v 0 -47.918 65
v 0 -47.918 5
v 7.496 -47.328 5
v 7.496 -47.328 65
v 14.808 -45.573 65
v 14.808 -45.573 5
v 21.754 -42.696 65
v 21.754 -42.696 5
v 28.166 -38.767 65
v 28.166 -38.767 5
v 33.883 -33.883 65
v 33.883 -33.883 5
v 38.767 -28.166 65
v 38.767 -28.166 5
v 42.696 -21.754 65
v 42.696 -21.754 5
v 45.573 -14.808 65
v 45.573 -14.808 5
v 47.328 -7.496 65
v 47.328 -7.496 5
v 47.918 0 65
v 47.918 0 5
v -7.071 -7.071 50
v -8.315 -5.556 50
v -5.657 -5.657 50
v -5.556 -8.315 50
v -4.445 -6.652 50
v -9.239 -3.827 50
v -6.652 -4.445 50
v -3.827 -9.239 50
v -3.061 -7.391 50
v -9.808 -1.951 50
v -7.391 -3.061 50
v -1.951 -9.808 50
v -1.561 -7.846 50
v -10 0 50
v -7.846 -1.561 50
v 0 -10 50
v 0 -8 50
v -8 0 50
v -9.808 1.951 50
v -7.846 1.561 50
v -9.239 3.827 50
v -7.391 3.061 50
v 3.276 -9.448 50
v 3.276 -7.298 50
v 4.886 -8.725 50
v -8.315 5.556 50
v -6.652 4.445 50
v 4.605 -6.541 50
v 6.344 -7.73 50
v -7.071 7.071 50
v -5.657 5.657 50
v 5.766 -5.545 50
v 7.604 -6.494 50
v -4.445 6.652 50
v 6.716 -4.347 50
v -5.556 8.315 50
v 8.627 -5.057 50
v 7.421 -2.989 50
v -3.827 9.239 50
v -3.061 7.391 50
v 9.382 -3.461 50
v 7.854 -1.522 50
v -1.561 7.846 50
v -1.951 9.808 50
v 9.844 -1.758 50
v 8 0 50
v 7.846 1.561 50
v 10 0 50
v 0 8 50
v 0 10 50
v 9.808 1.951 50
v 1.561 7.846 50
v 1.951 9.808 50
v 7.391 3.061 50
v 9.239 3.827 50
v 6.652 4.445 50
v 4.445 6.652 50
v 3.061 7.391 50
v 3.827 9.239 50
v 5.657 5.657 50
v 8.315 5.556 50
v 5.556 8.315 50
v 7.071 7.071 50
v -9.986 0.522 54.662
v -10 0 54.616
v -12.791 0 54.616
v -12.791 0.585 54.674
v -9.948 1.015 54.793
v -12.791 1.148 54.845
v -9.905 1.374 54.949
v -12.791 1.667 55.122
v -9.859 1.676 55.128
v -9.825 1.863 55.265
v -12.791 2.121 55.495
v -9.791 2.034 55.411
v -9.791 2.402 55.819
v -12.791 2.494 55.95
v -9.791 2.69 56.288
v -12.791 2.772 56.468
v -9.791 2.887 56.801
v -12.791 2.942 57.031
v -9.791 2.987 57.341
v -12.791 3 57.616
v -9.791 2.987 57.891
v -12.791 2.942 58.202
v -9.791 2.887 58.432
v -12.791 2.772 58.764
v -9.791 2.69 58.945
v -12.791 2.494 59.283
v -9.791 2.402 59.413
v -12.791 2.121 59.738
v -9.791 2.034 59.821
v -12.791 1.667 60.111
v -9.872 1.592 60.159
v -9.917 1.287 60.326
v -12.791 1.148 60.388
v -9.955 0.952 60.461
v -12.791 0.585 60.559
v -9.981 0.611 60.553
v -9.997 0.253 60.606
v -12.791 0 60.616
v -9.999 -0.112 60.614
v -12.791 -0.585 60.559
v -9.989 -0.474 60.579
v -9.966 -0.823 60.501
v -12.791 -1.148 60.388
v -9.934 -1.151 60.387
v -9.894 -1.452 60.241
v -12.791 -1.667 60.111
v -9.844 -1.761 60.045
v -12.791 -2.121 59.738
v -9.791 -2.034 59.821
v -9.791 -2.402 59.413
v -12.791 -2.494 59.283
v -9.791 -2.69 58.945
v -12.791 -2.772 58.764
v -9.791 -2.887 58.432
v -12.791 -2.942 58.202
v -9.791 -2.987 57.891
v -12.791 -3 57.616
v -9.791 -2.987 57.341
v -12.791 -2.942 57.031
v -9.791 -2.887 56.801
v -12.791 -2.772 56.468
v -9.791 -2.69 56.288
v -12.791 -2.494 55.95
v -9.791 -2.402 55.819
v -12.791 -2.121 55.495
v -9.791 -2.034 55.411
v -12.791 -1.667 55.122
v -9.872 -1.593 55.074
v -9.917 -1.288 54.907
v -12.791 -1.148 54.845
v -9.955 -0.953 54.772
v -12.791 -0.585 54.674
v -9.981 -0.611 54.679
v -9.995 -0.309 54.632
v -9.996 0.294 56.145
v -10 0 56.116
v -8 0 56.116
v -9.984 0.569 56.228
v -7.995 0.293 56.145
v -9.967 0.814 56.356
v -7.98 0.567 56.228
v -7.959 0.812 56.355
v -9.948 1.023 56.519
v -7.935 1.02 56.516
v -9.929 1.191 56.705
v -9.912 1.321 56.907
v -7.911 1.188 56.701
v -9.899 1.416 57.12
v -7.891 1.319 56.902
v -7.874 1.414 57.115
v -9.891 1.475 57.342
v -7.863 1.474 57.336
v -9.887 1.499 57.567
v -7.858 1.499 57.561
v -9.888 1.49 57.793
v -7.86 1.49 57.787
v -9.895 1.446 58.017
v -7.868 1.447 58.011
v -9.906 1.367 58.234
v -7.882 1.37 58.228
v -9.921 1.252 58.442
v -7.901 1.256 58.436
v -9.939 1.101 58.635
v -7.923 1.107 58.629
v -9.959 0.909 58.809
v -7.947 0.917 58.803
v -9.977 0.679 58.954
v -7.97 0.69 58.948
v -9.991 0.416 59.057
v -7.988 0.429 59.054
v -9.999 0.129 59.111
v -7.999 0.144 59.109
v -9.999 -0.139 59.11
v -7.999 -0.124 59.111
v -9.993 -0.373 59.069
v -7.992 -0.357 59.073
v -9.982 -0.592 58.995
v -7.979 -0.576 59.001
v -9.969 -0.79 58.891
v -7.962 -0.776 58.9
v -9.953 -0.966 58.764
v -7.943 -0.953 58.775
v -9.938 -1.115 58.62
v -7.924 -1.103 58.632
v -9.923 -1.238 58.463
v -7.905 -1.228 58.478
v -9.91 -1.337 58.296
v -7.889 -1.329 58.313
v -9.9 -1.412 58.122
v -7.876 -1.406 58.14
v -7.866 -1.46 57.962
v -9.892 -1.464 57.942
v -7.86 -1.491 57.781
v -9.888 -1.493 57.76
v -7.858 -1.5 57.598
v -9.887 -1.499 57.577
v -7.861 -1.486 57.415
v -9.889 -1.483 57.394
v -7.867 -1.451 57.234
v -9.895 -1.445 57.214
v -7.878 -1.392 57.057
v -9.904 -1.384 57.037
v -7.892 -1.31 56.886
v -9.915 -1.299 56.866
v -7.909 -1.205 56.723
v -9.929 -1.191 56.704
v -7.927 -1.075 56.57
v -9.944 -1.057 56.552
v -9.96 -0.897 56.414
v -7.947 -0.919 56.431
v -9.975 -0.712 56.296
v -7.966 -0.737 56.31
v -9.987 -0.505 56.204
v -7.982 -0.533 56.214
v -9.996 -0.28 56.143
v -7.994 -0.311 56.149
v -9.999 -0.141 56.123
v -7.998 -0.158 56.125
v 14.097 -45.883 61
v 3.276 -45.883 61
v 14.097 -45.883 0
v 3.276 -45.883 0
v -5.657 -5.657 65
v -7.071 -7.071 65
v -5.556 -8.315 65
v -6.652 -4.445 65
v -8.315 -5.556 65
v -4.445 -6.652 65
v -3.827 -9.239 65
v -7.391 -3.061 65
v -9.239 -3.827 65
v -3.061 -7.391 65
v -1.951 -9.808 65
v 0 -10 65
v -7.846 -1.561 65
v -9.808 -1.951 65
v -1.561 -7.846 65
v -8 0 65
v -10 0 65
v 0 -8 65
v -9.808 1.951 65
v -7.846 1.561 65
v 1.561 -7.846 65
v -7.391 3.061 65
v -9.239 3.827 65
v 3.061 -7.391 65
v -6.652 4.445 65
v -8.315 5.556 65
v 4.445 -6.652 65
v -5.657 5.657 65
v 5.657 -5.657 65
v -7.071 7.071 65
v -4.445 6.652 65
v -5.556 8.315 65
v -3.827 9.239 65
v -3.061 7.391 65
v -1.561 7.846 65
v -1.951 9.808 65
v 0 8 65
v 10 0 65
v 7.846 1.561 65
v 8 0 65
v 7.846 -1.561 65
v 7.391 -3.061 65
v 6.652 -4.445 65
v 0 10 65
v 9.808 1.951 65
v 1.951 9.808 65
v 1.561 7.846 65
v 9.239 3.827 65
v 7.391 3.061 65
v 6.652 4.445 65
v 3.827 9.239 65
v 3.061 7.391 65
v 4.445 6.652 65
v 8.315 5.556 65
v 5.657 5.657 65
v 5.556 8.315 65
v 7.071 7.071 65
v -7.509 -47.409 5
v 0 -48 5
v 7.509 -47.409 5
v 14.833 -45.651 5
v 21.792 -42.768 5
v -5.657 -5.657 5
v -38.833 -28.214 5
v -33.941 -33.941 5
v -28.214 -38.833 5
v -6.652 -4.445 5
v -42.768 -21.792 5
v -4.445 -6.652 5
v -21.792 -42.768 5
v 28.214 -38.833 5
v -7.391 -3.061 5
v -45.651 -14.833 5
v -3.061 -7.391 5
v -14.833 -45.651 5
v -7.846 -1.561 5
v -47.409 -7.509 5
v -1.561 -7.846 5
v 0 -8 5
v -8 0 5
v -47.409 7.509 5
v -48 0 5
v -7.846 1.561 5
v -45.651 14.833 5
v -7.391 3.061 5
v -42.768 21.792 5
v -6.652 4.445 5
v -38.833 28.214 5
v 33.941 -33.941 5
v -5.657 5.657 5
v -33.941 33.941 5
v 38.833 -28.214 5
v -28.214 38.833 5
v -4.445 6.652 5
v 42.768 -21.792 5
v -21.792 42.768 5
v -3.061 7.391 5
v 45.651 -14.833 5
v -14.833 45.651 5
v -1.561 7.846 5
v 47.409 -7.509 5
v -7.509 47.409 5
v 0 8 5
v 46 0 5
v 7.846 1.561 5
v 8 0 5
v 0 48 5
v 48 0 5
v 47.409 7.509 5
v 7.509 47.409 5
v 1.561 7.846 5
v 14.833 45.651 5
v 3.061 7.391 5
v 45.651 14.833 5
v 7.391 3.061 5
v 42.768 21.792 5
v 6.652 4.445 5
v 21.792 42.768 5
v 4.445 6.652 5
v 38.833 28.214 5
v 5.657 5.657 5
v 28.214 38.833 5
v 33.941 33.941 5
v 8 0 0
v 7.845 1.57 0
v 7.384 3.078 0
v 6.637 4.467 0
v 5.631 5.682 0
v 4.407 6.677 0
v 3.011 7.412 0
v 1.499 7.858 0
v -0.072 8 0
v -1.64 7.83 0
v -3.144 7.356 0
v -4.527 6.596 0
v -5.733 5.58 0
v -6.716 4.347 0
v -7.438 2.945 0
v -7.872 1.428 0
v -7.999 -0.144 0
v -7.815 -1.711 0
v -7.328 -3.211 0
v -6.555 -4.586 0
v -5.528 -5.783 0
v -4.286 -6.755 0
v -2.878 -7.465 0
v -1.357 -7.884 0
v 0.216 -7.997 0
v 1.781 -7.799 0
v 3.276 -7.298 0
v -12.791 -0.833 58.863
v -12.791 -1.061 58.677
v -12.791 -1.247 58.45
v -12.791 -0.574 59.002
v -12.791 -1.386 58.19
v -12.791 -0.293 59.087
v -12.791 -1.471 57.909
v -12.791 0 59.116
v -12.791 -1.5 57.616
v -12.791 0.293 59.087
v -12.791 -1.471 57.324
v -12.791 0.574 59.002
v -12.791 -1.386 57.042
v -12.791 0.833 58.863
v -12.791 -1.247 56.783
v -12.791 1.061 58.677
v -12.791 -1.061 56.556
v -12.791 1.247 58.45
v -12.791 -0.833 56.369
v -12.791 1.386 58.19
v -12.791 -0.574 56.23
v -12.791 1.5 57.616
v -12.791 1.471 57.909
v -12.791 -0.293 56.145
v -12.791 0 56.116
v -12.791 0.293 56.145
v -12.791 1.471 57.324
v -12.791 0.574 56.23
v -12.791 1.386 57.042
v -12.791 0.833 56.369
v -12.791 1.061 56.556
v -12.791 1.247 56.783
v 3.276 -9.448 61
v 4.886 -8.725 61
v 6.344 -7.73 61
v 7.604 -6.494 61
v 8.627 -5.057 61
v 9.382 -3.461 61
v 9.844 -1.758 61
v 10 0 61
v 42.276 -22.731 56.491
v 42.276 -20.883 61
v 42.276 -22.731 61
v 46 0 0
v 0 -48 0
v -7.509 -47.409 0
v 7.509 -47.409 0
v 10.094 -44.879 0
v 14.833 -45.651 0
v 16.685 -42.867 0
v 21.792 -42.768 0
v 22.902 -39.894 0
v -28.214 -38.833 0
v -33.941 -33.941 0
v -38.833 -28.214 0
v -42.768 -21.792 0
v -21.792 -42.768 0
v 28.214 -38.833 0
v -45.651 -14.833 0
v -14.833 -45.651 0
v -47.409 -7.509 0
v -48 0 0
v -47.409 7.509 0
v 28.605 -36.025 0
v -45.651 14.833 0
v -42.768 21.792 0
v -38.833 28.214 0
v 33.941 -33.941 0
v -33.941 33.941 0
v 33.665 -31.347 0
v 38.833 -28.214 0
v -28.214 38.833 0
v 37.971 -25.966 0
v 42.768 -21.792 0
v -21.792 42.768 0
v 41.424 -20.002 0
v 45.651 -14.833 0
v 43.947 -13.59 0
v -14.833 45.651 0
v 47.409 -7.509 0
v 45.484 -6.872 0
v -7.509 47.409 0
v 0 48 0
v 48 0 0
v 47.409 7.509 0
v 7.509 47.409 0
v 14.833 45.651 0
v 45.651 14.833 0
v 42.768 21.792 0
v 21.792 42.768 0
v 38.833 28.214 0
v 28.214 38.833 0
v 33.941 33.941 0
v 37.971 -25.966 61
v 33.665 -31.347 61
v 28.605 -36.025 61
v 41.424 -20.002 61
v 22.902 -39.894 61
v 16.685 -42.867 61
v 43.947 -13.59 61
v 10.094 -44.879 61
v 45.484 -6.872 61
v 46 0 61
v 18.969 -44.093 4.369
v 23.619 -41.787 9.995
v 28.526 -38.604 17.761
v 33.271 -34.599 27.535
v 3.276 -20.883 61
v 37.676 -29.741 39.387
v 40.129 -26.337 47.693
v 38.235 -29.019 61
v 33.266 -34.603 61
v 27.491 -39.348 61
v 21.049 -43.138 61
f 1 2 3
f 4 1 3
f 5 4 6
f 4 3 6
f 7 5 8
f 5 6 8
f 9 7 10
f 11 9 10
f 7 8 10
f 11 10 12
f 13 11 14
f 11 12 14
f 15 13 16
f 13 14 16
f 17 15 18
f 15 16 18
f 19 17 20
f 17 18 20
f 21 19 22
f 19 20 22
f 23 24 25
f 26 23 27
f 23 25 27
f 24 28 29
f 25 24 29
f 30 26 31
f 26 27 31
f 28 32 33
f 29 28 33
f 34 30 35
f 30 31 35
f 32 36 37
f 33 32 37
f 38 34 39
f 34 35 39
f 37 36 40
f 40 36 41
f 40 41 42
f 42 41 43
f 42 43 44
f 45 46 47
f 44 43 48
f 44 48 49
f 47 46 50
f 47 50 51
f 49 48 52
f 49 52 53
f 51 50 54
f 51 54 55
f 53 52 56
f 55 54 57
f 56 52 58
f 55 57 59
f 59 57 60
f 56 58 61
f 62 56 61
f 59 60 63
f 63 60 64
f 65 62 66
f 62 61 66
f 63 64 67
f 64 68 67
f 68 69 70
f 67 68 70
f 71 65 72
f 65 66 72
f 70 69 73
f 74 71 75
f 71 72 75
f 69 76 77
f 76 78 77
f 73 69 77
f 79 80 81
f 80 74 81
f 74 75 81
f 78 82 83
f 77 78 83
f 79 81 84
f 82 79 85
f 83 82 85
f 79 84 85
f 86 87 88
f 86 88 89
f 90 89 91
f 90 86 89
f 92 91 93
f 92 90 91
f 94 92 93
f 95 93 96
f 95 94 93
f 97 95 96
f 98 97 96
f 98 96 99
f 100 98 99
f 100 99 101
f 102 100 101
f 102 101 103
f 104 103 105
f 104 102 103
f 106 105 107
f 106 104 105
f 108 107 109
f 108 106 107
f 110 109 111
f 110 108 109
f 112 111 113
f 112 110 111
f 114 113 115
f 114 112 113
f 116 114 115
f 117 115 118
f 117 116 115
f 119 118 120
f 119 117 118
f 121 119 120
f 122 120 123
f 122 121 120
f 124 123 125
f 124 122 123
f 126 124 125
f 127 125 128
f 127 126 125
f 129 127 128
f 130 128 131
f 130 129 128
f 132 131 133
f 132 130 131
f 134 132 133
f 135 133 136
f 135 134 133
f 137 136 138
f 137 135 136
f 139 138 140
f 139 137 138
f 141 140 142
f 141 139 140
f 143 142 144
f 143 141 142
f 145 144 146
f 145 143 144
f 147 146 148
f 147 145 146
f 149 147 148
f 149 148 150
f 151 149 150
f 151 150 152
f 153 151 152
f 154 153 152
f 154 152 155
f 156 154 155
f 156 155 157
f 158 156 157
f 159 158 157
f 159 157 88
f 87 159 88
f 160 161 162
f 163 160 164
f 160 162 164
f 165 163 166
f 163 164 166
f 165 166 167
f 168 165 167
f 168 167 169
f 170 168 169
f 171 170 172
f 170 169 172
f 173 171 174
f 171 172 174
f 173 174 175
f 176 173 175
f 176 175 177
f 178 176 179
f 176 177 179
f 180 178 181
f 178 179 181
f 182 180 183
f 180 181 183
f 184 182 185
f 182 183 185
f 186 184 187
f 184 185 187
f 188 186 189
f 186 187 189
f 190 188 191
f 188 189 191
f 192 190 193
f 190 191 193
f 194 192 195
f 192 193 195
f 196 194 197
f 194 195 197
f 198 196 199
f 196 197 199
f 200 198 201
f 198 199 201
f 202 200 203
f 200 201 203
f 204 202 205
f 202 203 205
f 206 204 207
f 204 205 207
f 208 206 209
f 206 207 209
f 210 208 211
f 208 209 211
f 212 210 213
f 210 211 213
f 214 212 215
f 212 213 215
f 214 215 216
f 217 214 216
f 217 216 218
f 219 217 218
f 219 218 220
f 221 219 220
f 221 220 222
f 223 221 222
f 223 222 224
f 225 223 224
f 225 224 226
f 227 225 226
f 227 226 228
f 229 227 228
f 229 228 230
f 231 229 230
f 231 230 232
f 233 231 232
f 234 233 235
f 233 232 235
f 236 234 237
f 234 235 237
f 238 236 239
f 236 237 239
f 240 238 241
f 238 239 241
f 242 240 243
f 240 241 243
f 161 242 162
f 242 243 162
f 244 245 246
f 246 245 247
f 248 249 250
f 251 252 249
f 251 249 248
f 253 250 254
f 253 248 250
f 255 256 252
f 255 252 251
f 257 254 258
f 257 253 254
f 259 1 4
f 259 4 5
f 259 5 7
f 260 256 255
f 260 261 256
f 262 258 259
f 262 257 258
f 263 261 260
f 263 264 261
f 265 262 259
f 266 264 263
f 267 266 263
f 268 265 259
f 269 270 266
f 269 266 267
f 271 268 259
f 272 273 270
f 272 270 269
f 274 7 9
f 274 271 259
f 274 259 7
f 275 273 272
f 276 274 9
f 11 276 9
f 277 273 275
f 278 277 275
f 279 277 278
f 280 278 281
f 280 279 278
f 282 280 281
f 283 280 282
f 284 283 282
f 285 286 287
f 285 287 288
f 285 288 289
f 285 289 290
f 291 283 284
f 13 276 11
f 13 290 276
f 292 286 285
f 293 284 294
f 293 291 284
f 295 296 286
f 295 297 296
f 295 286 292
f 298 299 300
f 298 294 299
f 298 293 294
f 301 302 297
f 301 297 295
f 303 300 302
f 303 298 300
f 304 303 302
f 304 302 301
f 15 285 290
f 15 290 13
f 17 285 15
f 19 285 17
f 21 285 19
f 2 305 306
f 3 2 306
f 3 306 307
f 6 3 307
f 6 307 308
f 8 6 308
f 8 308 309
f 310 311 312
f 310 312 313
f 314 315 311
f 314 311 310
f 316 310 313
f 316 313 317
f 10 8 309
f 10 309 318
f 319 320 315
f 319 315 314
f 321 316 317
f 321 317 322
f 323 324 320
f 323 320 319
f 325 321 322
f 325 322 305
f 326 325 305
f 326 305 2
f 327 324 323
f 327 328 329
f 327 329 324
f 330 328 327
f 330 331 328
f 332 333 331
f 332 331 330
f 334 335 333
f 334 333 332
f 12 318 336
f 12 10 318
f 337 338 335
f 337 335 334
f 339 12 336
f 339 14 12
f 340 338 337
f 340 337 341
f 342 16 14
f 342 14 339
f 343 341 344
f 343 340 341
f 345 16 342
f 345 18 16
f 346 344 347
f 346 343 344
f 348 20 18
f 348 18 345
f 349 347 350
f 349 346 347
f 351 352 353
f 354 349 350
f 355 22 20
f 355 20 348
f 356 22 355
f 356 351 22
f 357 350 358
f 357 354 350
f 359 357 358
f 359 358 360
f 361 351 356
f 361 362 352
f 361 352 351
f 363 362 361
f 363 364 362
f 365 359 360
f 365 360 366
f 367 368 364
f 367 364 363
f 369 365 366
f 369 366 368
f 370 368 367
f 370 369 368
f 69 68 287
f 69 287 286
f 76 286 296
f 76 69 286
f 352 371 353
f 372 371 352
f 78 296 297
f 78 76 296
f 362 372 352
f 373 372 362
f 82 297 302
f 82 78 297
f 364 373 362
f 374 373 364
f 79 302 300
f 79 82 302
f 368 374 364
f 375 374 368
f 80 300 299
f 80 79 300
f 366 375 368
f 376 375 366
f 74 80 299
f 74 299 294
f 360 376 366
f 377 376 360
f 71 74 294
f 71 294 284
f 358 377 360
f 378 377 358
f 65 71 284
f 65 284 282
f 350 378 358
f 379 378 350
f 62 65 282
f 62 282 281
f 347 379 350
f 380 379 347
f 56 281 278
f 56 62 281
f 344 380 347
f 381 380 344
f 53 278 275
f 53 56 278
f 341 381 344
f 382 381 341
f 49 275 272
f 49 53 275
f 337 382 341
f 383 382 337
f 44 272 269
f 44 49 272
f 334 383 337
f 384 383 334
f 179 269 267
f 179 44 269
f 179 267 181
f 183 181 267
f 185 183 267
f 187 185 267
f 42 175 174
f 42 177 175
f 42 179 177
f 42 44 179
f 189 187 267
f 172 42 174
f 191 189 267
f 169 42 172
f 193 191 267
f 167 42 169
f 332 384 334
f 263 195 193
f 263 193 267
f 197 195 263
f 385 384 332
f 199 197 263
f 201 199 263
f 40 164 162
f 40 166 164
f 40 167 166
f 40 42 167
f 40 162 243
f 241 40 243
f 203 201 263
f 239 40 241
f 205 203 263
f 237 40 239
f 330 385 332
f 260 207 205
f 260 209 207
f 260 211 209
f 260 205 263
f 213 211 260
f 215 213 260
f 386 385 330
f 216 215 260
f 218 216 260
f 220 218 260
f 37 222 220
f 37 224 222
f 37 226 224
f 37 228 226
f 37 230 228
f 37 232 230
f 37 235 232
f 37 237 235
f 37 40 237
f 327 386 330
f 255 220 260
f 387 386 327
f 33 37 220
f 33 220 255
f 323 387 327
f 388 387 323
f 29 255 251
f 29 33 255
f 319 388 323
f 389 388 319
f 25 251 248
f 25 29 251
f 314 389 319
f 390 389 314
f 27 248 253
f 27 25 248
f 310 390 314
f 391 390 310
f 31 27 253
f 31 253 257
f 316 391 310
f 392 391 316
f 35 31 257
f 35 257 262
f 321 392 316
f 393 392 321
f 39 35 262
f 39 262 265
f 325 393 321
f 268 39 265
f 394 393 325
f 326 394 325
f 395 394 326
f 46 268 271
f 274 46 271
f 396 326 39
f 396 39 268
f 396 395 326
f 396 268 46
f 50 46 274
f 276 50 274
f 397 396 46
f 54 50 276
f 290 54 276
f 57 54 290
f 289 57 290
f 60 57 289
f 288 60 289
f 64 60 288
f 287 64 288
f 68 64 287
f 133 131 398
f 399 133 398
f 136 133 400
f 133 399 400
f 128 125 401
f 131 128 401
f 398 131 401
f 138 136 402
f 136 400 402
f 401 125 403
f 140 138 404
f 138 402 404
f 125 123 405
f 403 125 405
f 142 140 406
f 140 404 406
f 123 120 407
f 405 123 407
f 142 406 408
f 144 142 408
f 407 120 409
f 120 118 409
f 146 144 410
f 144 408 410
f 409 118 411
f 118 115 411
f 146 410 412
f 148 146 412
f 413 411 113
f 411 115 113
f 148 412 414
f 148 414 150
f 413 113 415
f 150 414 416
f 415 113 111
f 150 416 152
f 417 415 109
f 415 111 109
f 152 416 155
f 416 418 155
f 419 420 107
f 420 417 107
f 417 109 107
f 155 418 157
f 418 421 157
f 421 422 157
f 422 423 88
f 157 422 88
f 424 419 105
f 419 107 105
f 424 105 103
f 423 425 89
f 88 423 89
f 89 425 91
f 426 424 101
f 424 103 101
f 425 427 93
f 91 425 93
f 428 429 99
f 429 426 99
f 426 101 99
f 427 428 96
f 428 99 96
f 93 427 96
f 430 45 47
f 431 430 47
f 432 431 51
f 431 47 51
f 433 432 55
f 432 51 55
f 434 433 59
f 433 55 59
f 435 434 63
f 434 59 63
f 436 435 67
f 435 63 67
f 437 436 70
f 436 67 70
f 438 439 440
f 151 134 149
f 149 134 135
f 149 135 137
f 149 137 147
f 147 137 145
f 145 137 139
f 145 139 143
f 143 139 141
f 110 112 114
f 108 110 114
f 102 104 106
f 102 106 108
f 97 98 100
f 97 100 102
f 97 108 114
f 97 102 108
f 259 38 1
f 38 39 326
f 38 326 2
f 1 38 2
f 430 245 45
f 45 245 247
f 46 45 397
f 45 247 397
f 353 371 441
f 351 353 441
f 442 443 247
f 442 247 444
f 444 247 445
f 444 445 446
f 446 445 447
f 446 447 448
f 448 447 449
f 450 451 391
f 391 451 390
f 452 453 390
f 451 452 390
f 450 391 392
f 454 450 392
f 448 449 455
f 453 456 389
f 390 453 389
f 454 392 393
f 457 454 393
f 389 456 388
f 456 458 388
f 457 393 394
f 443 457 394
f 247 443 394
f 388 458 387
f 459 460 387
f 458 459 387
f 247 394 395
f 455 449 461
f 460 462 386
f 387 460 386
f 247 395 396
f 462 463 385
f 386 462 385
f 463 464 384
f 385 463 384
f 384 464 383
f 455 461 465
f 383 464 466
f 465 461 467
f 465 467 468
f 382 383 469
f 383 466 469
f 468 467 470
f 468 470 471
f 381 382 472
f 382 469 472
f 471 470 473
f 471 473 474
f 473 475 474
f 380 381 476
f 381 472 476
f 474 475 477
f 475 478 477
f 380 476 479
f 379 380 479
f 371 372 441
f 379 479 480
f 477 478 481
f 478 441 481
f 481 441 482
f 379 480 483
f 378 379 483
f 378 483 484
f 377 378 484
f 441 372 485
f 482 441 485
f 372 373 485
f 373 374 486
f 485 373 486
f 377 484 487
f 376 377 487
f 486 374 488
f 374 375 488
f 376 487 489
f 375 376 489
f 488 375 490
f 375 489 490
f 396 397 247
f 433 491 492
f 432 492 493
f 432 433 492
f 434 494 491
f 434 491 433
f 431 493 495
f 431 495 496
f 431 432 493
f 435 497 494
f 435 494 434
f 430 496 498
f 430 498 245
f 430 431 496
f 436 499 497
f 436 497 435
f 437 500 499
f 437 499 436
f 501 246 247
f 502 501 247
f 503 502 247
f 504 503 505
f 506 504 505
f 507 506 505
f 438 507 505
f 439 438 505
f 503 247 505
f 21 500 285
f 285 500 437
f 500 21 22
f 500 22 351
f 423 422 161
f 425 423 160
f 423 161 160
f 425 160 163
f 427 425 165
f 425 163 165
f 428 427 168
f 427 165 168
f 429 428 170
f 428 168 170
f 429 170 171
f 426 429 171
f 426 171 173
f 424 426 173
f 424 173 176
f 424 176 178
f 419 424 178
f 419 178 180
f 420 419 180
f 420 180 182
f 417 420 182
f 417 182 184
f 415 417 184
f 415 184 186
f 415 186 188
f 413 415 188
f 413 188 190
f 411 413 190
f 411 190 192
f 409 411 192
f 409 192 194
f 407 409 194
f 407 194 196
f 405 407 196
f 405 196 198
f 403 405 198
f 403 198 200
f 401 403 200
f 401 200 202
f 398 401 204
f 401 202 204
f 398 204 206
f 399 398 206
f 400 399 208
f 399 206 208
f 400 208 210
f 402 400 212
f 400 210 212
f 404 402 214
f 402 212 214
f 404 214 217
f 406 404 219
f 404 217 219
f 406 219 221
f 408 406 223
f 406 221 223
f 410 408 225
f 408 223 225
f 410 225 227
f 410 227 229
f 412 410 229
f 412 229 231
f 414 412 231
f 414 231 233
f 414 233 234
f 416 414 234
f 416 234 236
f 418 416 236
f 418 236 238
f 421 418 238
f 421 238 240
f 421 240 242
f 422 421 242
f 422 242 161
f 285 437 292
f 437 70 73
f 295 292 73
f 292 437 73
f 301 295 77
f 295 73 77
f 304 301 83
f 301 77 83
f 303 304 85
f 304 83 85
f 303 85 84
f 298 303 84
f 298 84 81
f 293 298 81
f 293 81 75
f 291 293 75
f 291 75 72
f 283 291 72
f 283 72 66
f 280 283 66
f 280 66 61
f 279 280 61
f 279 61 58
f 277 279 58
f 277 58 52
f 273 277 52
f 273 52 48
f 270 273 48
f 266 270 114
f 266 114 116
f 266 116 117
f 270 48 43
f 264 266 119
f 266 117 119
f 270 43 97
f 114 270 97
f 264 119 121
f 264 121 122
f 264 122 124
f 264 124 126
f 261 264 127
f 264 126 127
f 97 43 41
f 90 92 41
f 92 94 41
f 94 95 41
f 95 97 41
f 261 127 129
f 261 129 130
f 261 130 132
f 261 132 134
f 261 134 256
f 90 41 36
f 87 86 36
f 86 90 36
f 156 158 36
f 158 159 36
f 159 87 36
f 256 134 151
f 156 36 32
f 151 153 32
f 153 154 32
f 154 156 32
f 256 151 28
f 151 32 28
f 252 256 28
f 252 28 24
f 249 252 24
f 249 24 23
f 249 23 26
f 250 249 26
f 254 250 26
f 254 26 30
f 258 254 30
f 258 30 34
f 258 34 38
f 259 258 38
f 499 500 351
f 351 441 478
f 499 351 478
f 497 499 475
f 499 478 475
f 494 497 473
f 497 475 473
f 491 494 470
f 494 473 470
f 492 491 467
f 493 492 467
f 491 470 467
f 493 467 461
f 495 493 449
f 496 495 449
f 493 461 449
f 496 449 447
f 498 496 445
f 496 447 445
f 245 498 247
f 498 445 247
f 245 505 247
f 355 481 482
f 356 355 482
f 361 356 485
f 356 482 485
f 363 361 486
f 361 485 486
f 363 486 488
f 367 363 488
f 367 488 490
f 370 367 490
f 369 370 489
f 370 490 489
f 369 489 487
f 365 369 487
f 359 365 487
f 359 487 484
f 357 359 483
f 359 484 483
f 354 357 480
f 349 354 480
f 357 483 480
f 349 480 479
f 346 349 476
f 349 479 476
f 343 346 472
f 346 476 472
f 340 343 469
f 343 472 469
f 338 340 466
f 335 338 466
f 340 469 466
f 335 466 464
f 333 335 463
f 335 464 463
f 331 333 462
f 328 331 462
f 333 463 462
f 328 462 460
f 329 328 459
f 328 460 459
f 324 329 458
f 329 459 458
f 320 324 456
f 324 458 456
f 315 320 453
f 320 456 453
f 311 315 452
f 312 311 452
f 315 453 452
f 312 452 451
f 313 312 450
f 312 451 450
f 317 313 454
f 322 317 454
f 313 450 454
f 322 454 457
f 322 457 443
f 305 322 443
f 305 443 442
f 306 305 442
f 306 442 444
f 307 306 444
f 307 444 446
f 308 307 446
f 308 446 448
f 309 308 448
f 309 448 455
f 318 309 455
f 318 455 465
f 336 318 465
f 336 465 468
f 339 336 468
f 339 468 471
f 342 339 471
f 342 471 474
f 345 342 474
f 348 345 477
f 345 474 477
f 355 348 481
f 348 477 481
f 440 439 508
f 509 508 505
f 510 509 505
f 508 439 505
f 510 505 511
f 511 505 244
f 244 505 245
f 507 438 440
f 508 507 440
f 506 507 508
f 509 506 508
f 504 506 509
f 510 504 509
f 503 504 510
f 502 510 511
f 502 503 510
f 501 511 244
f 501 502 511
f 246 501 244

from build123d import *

# Parameters (mm, degrees)
SKETCH1_R            = 48
SKETCH1_R_2          = 8
BOSS_EXTRUDE1_DEPTH  = 5
BOSS_EXTRUDE2_DEPTH  = 60
CUT_EXTRUDE1_DEPTH   = 61
BOSS_EXTRUDE5_START  = -15
SKETCH8_R            = 10
SKETCH8_R_2          = 8
BOSS_EXTRUDE5_DEPTH  = 15
BOSS_EXTRUDE10_DEPTH = 39
SKETCH10_R           = 64.589244017
SKETCH10_R_2         = 48
CUT_EXTRUDE2_DEPTH   = 100
SKETCH11_R           = 1.5
CUT_EXTRUDE5_DEPTH   = 16
SKETCH12_R           = 3
SKETCH12_R_2         = 1.5
BOSS_EXTRUDE12_DEPTH = 3


with BuildPart() as part:
    # Sketch1 → Boss-Extrude1 (new body)
    with BuildSketch(Plane.XY):
        Circle(SKETCH1_R)
        Circle(SKETCH1_R_2, mode=Mode.SUBTRACT)
    extrude(amount=BOSS_EXTRUDE1_DEPTH)

    # Sketch2 → Boss-Extrude2 (add)
    with BuildSketch(Plane.XY.offset(5)):
        with BuildLine():
            Line((0, -8), (0, -47.918307097))
            ThreePointArc((0, -47.918307097), (33.883359891, -33.883359891), (47.918307097, 0))
            Line((47.918307097, 0), (8, 0))
            ThreePointArc((8, 0), (5.656854249, -5.656854249), (0, -8))
        make_face()
    extrude(amount=BOSS_EXTRUDE2_DEPTH)

    # Sketch3 → Cut-Extrude1 (cut)
    with BuildSketch(Plane(origin=(0, 0, 0), x_dir=(-1, 0, 0), z_dir=(0, 0, -1))):
        with BuildLine():
            Line((-3.276389164, -45.883169834), (-3.276389164, -8))
            Line((-3.276389164, -8), (-3.276389164, -7.298306245))
            ThreePointArc((-3.276389164, -7.298306245), (-6.716067053, -4.346773901), (-8, 0))
            Line((-8, 0), (-46, 0))
            ThreePointArc((-46, 0), (-33.665367231, -31.347137816), (-3.276389164, -45.883169834))
        make_face()
    extrude(amount=-CUT_EXTRUDE1_DEPTH, mode=Mode.SUBTRACT)

    # Sketch8 → Boss-Extrude5 (add)
    with BuildSketch(Plane.XY.offset(65).offset(BOSS_EXTRUDE5_START)):
        Circle(SKETCH8_R)
        Circle(SKETCH8_R_2, mode=Mode.SUBTRACT)
    extrude(amount=BOSS_EXTRUDE5_DEPTH)

    # Sketch11 → Cut-Extrude5 (cut)
    with BuildSketch(Plane(origin=(0, 0, 0), x_dir=(0, 0, -1), z_dir=(1, 0, 0))):
        with Locations((-57.616287705, 0)):
            Circle(SKETCH11_R)
    extrude(amount=-CUT_EXTRUDE5_DEPTH, mode=Mode.SUBTRACT)

    # Sketch12 → Boss-Extrude12 (add)
    with BuildSketch(Plane(origin=(-9.790957965, 0, 0), x_dir=(0, 0, -1), z_dir=(1, 0, 0))):
        with Locations((-57.616287705, 0)):
            Circle(SKETCH12_R)
        with Locations((-57.616287705, 0)):
            Circle(SKETCH12_R_2, mode=Mode.SUBTRACT)
    extrude(amount=-BOSS_EXTRUDE12_DEPTH)


with BuildPart() as body_2:
    # Sketch9 → Boss-Extrude10 (new body)
    with BuildSketch(Plane(origin=(3.276389164, 0, 0), x_dir=(0, 0, -1), z_dir=(1, 0, 0))):
        Polygon((-61, -45.883169834), (0, -45.883169834), (-61, -20.883169834), align=None)
    extrude(amount=BOSS_EXTRUDE10_DEPTH)

    # Sketch10 → Cut-Extrude2 (cut)
    with BuildSketch(Plane(origin=(0, 0, 0), x_dir=(-1, 0, 0), z_dir=(0, 0, -1))):
        Circle(SKETCH10_R)
        with Locations(Location((0, 0, 0), (0, 0, 180))):
            Circle(SKETCH10_R_2, mode=Mode.SUBTRACT)
    extrude(amount=-CUT_EXTRUDE2_DEPTH, mode=Mode.SUBTRACT)


solid = Compound([part.part, body_2.part])
